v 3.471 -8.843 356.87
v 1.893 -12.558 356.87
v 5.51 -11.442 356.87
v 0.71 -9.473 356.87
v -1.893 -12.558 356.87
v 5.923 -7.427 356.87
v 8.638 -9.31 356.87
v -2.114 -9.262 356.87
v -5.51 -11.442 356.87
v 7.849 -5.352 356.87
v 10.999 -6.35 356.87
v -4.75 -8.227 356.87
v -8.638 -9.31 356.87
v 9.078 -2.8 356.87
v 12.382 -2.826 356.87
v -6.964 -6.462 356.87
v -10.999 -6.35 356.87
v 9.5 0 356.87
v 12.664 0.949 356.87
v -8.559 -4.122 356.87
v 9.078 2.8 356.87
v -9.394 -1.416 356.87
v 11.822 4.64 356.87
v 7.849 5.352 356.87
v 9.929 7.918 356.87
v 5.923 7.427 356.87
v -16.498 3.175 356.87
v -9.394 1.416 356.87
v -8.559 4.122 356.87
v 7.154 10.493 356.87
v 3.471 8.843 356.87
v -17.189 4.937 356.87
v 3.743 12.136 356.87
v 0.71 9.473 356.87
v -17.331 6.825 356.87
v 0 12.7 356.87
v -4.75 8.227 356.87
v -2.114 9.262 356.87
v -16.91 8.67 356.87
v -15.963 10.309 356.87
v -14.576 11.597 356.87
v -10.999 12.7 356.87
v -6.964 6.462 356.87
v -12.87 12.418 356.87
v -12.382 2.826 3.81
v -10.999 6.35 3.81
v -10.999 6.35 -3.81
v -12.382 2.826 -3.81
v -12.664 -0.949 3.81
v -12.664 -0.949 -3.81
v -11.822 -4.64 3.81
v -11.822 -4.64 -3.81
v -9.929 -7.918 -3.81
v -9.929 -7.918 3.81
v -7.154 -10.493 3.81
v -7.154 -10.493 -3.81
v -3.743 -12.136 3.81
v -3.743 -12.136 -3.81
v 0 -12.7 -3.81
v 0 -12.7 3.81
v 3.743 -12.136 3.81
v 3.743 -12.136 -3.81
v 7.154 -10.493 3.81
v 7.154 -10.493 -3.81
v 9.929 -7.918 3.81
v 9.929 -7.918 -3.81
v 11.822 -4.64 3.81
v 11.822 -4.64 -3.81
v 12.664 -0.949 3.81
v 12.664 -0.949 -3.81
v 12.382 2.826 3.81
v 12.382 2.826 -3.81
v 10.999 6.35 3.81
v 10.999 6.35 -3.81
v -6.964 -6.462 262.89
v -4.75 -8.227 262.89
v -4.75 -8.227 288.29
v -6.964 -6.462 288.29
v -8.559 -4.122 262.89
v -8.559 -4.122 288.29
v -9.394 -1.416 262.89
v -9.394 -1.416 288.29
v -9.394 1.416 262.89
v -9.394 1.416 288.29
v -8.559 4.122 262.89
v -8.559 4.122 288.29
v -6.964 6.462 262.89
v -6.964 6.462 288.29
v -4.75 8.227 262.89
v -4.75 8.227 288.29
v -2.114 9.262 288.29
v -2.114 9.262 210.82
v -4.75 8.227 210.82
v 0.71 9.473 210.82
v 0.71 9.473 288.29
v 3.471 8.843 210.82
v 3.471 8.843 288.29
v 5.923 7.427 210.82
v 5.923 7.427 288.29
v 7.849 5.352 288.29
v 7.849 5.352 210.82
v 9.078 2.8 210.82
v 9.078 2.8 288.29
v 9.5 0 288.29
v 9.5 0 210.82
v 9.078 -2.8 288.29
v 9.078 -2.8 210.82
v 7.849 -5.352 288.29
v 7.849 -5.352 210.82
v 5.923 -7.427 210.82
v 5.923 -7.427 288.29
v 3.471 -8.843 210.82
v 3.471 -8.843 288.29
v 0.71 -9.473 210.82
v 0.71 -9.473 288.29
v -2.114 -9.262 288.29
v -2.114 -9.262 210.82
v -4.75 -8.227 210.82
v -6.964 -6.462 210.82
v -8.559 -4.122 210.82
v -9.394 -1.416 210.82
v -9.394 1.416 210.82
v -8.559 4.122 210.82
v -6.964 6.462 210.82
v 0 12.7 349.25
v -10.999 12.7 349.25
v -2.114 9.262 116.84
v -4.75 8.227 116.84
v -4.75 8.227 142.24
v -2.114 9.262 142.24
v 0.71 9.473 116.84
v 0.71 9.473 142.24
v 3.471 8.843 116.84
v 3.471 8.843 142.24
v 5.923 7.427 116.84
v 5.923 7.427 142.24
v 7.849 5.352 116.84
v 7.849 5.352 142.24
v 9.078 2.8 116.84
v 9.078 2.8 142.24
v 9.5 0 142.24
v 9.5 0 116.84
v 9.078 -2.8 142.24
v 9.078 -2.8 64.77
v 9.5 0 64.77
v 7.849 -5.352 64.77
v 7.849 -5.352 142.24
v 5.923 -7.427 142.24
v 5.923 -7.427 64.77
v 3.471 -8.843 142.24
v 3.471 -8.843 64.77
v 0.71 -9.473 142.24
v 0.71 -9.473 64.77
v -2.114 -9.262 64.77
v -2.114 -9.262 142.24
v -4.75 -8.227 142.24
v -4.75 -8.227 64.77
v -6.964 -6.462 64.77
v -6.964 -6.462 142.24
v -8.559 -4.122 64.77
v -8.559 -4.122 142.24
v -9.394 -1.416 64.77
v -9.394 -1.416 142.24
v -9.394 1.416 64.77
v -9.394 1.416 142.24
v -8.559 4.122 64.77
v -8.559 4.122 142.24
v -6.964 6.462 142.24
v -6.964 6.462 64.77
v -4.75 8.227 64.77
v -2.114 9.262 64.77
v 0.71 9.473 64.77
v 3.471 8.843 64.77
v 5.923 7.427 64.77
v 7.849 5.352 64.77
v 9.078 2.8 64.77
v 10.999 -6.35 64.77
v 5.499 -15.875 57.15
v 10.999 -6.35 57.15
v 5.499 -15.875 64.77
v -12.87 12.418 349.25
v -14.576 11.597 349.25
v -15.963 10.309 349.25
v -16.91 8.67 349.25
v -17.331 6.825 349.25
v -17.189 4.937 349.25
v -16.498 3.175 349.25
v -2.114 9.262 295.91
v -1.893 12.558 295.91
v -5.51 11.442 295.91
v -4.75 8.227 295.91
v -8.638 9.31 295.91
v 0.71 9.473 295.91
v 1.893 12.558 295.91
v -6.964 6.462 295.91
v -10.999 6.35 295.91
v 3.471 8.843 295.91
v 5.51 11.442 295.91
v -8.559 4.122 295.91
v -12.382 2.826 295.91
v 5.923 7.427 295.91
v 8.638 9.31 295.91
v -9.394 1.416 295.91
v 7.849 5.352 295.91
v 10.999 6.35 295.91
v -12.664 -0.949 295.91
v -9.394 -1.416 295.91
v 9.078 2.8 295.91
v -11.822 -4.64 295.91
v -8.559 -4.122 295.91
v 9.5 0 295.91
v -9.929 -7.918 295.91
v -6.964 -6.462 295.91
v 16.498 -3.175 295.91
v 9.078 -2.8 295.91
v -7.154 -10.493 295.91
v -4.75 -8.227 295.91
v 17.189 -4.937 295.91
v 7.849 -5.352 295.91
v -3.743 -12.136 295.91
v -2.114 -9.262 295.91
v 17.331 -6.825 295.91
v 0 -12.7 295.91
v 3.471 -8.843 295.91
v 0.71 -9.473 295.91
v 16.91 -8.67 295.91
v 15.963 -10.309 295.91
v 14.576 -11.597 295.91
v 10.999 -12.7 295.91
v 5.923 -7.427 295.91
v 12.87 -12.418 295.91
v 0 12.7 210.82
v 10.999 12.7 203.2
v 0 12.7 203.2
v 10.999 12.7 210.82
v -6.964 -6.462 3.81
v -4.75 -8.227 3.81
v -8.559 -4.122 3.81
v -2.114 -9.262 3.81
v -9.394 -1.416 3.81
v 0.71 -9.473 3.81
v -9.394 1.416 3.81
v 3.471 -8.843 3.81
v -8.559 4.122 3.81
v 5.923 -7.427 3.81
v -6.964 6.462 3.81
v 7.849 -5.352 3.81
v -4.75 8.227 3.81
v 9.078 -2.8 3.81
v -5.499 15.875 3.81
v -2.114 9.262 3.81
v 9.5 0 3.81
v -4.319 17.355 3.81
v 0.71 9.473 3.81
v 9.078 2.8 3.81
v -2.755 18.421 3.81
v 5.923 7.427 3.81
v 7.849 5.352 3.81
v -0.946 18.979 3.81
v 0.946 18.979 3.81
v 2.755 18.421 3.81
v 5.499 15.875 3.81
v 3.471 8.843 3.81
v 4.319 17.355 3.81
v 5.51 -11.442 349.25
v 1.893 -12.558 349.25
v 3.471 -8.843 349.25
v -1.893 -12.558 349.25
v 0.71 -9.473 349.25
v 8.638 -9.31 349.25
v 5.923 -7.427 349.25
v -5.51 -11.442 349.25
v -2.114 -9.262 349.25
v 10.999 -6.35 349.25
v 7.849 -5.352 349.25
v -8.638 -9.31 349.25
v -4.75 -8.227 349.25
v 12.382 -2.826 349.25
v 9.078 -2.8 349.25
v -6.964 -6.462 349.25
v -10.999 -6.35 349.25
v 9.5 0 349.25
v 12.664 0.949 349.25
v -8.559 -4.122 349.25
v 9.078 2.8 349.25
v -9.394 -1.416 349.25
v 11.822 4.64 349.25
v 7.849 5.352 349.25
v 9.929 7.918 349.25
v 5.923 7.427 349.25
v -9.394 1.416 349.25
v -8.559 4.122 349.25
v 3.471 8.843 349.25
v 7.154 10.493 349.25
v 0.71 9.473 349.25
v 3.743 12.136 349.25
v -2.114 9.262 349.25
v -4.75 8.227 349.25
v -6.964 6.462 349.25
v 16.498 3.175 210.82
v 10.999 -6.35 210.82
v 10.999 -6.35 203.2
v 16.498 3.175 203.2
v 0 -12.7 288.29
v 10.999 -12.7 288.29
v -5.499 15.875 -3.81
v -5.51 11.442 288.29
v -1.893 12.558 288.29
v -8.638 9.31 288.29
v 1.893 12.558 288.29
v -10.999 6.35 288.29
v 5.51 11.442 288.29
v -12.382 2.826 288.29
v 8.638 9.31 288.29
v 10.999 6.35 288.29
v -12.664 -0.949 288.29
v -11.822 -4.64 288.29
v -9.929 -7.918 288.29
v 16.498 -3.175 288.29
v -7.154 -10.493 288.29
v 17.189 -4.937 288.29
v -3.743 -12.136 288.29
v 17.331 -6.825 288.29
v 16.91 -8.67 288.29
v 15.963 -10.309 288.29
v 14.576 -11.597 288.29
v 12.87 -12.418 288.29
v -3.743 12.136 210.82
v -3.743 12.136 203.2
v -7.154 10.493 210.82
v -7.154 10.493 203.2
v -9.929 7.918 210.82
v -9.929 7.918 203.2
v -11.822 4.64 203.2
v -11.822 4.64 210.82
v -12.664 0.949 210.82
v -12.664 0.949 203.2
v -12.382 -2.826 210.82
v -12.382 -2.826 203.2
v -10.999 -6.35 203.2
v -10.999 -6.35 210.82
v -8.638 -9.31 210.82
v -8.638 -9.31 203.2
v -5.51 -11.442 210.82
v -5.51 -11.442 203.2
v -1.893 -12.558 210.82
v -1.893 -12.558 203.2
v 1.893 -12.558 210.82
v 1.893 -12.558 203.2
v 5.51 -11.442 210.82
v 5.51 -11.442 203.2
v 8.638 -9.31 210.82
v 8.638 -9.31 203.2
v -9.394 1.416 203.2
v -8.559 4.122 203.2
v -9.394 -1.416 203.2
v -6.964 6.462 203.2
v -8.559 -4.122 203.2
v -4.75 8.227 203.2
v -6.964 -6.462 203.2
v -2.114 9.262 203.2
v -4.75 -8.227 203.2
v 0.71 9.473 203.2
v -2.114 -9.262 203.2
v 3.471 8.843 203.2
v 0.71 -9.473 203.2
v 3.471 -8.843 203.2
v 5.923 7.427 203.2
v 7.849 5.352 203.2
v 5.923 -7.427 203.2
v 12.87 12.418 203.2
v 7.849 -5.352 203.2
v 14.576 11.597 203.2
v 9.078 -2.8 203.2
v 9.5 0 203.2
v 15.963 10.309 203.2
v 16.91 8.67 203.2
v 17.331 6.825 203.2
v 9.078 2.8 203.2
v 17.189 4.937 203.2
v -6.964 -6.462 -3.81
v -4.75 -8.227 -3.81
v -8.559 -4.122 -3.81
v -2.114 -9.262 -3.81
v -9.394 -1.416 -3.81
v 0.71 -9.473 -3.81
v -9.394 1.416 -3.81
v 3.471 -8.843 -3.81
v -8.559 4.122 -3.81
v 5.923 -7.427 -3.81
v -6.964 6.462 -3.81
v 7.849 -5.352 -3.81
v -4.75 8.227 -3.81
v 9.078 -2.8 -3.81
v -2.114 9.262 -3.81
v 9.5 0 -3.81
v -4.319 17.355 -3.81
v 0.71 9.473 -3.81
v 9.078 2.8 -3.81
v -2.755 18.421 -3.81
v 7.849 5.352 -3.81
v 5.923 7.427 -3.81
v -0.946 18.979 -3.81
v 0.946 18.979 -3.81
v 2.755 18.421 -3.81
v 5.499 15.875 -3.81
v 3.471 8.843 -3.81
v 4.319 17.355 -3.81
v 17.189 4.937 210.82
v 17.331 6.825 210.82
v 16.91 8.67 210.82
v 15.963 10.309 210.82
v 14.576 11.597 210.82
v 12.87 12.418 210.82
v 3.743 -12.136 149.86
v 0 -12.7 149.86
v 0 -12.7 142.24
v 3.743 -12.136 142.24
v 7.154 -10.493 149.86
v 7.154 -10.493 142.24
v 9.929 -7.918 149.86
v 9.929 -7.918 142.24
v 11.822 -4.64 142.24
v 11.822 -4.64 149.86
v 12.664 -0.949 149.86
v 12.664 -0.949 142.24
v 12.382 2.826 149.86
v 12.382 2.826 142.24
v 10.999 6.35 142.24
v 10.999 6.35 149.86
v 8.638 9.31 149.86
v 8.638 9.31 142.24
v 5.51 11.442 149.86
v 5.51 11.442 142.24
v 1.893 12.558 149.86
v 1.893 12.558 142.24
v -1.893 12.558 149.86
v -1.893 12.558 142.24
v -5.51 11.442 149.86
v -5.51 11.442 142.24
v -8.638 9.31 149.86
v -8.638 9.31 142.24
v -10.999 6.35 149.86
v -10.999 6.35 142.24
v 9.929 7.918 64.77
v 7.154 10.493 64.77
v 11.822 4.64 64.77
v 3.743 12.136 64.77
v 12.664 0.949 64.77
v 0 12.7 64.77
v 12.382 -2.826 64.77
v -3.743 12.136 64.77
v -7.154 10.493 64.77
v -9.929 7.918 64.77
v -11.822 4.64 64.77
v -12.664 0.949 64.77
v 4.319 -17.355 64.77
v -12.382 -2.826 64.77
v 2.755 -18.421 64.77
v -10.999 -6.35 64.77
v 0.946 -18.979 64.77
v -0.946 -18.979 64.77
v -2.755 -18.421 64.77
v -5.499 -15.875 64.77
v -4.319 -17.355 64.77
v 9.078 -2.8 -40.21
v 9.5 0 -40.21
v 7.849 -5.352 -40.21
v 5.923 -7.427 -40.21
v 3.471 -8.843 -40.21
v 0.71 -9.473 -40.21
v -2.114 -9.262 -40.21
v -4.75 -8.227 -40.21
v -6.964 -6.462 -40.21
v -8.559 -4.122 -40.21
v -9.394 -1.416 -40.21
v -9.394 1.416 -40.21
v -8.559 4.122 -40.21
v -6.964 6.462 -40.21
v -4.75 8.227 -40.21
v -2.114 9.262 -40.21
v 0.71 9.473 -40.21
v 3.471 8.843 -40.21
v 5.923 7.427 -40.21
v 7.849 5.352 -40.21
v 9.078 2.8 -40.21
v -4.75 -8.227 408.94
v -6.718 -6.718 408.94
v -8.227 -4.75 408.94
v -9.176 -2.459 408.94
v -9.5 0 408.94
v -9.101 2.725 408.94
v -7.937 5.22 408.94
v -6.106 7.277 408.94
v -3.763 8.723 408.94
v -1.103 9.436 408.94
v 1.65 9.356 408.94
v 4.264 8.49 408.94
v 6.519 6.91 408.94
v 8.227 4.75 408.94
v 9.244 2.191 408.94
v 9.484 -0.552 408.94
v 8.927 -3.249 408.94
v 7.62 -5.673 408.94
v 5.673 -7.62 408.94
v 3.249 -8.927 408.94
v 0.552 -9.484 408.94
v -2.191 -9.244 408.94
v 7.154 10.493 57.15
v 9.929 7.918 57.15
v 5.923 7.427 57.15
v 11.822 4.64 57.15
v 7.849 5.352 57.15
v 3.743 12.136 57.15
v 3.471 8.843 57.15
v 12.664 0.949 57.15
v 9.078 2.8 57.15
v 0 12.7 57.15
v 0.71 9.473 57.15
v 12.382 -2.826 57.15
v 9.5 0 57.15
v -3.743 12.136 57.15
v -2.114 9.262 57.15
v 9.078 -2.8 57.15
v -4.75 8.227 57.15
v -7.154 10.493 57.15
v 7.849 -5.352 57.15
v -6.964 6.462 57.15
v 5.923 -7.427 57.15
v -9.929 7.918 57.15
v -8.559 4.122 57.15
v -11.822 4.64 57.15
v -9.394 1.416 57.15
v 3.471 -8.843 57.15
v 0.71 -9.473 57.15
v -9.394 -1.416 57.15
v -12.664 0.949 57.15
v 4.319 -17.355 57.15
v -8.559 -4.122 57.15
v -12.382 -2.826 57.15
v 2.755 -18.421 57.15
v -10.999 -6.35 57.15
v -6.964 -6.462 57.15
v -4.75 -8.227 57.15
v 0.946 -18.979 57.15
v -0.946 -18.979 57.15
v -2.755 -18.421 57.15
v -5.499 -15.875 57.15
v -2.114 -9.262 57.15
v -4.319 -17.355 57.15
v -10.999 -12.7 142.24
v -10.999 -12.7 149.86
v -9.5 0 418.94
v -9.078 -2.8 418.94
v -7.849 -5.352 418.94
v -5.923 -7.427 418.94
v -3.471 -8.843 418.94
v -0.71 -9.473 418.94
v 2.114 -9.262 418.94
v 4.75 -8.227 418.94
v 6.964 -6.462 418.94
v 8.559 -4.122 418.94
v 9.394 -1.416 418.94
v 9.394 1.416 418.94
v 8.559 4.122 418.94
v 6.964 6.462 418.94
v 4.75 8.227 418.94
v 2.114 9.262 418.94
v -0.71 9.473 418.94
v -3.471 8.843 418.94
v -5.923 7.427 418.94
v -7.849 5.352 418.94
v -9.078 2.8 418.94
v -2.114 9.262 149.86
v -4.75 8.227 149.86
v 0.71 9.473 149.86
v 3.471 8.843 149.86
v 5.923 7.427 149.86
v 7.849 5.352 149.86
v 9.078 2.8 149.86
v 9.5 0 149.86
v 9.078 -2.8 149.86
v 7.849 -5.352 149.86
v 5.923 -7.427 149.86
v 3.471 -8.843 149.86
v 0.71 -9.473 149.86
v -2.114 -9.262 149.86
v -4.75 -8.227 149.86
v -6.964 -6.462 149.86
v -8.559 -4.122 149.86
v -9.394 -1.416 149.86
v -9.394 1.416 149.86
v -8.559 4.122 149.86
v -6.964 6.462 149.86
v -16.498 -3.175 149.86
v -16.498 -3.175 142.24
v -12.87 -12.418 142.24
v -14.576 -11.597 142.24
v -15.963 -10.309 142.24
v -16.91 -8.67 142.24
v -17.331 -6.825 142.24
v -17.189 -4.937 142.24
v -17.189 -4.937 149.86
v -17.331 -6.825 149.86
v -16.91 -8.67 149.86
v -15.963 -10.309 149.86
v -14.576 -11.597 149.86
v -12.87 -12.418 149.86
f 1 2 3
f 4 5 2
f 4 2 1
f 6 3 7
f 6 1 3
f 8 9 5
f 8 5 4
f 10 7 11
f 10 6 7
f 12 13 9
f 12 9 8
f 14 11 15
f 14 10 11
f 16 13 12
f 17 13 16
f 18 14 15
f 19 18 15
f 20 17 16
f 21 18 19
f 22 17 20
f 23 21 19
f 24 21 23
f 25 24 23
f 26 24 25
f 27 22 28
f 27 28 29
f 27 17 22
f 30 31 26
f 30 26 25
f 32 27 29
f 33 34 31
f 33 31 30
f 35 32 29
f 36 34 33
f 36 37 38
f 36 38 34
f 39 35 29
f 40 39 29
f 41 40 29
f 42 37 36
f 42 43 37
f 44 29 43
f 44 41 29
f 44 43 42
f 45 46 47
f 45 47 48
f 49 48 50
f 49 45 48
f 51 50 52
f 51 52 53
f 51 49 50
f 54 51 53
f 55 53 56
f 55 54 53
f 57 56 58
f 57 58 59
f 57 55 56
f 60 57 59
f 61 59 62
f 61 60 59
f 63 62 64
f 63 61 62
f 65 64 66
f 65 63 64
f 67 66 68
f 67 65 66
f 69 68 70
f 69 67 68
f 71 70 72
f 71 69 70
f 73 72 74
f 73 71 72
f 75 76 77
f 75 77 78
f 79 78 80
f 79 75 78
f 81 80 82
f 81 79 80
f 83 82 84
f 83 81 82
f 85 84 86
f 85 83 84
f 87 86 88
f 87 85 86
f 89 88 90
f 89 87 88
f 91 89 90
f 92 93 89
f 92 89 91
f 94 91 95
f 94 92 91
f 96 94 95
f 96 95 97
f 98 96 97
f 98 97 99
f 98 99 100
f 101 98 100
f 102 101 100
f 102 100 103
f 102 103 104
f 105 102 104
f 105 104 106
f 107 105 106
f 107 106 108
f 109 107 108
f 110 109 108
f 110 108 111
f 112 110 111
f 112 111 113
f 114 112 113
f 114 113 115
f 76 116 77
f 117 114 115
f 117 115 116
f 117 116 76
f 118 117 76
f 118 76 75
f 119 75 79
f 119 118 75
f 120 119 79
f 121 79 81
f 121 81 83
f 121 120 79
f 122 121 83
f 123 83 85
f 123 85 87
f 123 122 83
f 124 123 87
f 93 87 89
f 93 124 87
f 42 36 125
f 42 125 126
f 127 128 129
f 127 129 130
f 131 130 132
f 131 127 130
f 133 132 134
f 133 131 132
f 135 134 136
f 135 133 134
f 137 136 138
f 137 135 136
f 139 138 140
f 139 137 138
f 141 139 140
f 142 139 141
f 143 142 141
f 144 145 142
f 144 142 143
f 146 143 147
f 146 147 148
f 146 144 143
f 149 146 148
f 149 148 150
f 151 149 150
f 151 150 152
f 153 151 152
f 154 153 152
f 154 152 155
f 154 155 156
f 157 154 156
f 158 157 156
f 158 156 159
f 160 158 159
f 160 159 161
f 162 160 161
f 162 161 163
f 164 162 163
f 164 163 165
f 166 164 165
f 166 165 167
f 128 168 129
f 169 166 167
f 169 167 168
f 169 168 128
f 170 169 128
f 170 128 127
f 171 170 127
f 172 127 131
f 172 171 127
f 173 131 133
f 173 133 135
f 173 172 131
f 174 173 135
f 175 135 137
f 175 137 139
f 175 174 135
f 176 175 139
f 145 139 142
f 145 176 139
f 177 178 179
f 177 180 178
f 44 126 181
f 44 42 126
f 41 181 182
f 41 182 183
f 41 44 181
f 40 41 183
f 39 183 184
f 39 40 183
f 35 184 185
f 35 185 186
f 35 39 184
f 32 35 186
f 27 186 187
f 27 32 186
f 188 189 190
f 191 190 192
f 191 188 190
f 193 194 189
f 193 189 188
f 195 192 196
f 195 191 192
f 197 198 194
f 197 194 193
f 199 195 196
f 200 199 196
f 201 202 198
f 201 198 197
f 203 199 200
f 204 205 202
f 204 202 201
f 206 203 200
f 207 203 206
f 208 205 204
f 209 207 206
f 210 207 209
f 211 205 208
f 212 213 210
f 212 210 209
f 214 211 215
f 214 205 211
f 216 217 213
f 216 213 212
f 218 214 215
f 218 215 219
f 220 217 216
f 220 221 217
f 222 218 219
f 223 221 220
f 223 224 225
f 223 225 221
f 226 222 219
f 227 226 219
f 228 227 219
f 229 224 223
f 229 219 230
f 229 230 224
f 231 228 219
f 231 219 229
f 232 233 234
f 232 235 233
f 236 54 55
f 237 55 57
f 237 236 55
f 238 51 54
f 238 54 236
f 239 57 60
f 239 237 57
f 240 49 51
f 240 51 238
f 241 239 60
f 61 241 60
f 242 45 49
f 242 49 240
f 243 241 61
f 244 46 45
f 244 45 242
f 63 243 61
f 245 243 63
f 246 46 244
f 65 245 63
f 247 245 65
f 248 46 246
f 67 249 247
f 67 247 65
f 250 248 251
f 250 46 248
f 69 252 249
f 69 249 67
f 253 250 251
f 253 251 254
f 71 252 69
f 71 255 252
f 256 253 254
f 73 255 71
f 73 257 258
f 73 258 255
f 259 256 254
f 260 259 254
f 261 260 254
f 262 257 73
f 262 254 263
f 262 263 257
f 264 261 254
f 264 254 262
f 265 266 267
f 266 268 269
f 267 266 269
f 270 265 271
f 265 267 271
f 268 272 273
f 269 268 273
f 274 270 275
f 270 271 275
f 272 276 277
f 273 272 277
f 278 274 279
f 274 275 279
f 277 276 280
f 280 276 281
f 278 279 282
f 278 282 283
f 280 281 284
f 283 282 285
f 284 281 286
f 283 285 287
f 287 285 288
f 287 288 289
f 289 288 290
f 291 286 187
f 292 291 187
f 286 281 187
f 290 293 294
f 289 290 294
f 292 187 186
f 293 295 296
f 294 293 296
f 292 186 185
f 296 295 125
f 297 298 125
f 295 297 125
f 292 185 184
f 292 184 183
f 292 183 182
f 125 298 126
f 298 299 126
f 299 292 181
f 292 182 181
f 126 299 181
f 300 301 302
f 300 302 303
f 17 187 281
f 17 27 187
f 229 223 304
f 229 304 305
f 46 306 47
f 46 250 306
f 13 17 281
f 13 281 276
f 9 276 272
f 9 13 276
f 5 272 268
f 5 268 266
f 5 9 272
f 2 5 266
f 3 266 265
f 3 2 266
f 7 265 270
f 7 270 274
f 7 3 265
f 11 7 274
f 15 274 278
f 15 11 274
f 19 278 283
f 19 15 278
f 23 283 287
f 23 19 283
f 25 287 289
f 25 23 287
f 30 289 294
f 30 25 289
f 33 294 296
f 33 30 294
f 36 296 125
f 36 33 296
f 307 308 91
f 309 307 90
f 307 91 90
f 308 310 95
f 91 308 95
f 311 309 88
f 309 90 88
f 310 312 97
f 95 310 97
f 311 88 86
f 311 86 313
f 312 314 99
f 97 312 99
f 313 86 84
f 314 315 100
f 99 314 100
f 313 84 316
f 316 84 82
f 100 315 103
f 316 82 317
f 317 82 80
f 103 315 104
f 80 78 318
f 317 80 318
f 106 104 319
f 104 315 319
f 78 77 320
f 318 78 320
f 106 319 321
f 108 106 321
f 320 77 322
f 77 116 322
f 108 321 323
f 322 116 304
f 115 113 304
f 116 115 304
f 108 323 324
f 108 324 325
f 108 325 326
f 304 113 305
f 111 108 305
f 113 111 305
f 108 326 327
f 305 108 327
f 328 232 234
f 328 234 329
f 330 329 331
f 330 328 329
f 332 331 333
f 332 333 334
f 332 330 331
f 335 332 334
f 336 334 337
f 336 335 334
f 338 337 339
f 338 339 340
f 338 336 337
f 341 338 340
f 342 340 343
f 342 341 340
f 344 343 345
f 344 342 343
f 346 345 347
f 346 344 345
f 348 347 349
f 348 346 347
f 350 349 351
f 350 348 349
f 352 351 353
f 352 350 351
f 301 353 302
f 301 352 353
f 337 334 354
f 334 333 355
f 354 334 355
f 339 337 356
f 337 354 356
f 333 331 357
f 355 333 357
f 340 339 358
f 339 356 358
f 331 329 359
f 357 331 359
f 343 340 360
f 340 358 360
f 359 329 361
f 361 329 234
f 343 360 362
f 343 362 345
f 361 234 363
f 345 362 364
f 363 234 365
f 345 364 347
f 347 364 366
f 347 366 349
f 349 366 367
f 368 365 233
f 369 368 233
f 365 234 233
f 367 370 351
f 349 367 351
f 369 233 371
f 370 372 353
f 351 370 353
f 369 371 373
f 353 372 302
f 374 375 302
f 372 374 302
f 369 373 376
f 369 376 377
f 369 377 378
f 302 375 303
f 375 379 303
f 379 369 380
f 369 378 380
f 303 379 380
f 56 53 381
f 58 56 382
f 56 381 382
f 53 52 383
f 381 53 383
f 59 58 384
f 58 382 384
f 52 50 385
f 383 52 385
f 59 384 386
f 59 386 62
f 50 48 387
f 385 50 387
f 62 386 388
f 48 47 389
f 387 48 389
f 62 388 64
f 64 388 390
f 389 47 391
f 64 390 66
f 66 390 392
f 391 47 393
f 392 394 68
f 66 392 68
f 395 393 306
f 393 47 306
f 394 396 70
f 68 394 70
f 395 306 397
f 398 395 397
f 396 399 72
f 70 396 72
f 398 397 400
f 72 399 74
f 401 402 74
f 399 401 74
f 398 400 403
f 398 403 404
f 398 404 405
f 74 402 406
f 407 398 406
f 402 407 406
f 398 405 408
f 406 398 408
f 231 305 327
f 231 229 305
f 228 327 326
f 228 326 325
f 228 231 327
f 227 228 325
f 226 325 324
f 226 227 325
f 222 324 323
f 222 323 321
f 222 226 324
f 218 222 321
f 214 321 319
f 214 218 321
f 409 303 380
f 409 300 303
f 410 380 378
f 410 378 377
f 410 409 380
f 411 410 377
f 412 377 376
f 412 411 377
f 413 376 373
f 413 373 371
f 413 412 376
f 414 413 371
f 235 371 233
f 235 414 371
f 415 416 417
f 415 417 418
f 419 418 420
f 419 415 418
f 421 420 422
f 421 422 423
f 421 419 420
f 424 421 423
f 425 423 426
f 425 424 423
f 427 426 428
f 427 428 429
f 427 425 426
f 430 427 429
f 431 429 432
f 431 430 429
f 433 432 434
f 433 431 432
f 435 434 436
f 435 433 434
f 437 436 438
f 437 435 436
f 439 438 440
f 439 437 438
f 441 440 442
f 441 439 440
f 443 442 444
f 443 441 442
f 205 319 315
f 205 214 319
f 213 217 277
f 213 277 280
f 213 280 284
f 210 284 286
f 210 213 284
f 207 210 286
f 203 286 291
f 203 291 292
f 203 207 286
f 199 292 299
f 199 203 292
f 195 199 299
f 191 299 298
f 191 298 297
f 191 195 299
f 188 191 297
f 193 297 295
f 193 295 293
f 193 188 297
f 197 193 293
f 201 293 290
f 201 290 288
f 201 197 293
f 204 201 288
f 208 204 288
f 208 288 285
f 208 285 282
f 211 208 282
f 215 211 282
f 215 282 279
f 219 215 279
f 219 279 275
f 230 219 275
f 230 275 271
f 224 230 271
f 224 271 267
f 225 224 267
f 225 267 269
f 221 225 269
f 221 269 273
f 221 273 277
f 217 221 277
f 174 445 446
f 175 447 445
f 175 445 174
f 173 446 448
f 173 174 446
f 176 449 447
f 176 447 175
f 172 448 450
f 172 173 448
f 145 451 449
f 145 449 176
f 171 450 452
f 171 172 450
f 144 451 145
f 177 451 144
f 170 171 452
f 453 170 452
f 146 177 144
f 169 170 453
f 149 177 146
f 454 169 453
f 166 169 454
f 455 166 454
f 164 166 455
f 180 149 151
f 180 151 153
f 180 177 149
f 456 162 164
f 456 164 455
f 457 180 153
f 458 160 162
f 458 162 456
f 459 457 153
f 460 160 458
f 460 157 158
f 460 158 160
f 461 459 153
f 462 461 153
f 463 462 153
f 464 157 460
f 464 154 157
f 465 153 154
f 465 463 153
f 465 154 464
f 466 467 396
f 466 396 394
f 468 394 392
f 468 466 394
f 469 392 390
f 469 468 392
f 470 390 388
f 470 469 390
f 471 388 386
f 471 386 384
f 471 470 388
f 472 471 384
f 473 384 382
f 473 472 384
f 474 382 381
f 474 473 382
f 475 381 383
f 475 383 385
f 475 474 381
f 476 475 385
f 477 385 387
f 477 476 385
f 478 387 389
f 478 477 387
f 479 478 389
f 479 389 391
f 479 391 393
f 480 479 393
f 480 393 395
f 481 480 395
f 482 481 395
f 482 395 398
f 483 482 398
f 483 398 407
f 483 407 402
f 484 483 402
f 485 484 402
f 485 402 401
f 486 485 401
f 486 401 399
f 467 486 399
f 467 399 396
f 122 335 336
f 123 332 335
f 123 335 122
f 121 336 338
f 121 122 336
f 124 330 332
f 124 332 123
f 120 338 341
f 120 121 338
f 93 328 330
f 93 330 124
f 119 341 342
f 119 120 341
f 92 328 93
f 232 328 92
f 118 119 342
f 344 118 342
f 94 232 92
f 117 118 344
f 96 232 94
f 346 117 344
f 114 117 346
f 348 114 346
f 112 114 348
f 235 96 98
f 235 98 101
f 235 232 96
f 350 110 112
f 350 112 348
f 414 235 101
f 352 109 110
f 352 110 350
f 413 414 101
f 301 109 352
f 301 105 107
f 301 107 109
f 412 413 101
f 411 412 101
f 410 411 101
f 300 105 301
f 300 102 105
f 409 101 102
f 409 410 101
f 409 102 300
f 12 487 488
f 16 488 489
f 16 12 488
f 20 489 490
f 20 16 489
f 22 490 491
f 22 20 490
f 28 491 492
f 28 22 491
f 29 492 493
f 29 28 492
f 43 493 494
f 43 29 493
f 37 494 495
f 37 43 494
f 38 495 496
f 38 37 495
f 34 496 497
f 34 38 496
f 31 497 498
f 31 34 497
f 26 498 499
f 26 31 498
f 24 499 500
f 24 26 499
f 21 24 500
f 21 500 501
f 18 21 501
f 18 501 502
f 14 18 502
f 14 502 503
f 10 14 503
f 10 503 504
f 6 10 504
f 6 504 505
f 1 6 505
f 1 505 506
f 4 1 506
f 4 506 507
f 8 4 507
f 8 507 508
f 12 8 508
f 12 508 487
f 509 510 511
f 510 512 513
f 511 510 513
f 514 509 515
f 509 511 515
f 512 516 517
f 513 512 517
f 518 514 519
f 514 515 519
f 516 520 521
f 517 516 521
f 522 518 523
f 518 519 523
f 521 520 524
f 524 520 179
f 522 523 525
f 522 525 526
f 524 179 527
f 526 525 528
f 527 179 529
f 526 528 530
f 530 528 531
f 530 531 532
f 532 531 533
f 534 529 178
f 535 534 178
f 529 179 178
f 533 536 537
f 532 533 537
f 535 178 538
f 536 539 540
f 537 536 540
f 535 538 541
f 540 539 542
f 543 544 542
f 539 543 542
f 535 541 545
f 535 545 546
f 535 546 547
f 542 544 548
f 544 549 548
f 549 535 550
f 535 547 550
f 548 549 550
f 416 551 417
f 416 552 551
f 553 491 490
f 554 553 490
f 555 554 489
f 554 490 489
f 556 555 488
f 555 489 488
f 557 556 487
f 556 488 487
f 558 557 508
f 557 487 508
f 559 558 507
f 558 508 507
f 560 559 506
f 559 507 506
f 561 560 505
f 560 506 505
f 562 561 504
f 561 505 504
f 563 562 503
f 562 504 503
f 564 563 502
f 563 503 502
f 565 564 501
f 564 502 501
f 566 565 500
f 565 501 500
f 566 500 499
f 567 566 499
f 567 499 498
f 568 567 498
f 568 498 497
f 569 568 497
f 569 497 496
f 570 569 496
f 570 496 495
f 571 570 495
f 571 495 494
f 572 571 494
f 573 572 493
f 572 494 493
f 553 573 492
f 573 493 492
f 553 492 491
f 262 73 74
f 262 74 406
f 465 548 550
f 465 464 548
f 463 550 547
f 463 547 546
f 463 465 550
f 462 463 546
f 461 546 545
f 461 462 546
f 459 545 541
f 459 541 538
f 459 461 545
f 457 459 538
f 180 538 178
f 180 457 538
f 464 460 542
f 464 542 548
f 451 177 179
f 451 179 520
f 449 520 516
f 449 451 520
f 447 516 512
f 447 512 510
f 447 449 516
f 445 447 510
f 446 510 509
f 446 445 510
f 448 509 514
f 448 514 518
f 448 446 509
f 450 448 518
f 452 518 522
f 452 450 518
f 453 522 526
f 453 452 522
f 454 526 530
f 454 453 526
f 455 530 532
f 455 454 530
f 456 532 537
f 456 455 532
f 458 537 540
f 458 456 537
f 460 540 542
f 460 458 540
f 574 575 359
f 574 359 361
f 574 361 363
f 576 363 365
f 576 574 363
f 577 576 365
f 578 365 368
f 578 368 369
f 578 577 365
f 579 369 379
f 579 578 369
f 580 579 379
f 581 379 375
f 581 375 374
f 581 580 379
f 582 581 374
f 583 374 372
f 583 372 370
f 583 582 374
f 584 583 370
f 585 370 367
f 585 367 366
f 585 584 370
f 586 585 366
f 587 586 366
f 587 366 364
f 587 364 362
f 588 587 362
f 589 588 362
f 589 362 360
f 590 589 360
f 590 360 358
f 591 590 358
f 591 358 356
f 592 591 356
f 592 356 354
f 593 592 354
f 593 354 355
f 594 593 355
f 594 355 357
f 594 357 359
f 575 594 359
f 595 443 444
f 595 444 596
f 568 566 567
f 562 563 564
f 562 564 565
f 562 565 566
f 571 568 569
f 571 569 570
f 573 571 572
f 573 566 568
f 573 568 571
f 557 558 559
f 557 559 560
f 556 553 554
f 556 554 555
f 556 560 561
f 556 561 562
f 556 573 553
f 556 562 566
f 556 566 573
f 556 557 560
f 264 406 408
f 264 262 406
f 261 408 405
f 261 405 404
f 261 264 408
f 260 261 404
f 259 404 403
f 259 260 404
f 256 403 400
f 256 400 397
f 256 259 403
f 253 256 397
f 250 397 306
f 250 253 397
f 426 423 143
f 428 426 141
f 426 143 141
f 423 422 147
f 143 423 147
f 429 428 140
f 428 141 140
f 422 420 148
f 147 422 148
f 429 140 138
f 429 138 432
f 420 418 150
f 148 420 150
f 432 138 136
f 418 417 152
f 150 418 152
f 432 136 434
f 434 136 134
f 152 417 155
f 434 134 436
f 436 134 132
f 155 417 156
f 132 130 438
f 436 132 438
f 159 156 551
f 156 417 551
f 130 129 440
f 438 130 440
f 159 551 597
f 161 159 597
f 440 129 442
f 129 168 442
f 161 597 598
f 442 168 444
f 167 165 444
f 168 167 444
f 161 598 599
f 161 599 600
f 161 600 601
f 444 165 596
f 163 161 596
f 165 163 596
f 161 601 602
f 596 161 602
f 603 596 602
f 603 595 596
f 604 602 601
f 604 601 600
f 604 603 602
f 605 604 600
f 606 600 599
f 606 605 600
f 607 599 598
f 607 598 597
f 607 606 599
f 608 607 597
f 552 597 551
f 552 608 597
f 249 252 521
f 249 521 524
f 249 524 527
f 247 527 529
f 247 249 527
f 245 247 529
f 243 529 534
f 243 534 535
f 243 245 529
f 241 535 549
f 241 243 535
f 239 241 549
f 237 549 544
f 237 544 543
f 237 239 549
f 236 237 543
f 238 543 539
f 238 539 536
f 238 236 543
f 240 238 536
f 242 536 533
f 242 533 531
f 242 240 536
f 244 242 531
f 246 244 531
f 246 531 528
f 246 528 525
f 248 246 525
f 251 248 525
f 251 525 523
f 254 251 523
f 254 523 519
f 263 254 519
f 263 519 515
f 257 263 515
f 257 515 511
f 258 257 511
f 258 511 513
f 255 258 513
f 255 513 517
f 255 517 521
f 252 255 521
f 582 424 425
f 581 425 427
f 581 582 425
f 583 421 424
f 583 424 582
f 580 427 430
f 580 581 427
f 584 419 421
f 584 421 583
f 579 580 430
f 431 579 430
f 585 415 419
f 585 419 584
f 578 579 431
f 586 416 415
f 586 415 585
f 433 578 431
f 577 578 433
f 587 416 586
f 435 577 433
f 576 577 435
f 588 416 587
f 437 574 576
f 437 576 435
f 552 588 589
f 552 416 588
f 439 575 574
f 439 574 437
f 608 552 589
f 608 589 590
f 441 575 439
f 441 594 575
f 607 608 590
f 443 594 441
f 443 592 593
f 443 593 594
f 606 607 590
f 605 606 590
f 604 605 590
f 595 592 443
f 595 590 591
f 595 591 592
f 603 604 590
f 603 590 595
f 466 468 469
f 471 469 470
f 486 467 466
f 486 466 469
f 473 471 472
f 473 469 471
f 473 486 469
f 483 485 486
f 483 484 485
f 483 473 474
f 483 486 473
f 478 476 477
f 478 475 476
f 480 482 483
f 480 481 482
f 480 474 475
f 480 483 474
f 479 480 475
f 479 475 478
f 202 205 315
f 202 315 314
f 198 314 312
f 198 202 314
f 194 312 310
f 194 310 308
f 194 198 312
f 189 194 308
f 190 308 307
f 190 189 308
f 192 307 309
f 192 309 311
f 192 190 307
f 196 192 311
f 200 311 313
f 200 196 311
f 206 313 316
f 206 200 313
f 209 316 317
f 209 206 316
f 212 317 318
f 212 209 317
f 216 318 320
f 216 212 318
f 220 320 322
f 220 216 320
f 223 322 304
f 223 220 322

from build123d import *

# Parameters (mm, degrees)
BOSS_EXTRUDE1_DEPTH   = 3.81
BODY_MOVE_COPY2_ANGLE = 180
SKETCH2_R             = 9.5
BOSS_EXTRUDE2_DEPTH   = 146.05
LPATTERN1_COUNT       = 3
LPATTERN1_PITCH       = 146.05
BODY_MOVE_COPY3_ANGLE = 120
BODY_MOVE_COPY4_ANGLE = 120
BOSS_EXTRUDE3_START   = 27.94
SKETCH3_R             = 9.5
BOSS_EXTRUDE3_DEPTH   = 27.94
SKETCH4_R             = 9.5
CUT_EXTRUDE1_DEPTH    = 16.94
SKETCH5_R             = 9.5
BOSS_EXTRUDE4_DEPTH   = 10


with BuildPart() as part:
    # Sketch1 → Boss-Extrude1 (new, symmetric)
    with BuildSketch(Plane.XY):
        with BuildLine():
            Line((-5.499261314, 15.875), (-10.998522628, 6.35))
            ThreePointArc((-10.998522628, 6.35), (0, -12.7), (10.998522628, 6.35))
            Line((10.998522628, 6.35), (5.499261314, 15.875))
            ThreePointArc((5.499261314, 15.875), (0, 19.05), (-5.499261314, 15.875))
        make_face()
    extrude(amount=BOSS_EXTRUDE1_DEPTH, both=True)


with BuildPart() as body_2:
    # Body-Move/Copy1: copy of part
    add(part.part.moved(Location((0, 0, 60.96))))


with BuildPart() as body_2_1:
    # Body-Move/Copy2: moved
    add(body_2.part.rotate(Axis((0, 0, 0), (0, 0, 1)), BODY_MOVE_COPY2_ANGLE))


with BuildPart() as part_1:
    add(part.part)

    add(body_2_1.part)  # Boss-Extrude2 merges body 2
    # Sketch2 → Boss-Extrude2 (add)
    with BuildSketch(Plane(origin=(0, 0, -29.21), x_dir=(-1, 0, 0), z_dir=(0, 0, -1))):
        Circle(SKETCH2_R)
    extrude(amount=-BOSS_EXTRUDE2_DEPTH)


with BuildPart() as lpattern1_1:
    # LPattern1: pattern copy
    add(part_1.part.moved(Location(Vector(0, 0, 1) * (1 * LPATTERN1_PITCH))))


with BuildPart() as lpattern1_2:
    # LPattern1: pattern copy
    add(part_1.part.moved(Location(Vector(0, 0, 1) * (2 * LPATTERN1_PITCH))))


with BuildPart() as lpattern1_1_1:
    # Body-Move/Copy3: moved
    add(lpattern1_1.part.rotate(Axis((0, 0, 0), (0, 0, 1)), BODY_MOVE_COPY3_ANGLE))


with BuildPart() as lpattern1_2_1:
    # Body-Move/Copy4: moved
    add(lpattern1_2.part.rotate(Axis((0, 0, 0), (0, 0, -1)), BODY_MOVE_COPY4_ANGLE))


with BuildPart() as part_2:
    add(part_1.part)

    # Sketch3 → Boss-Extrude3 (add)
    with BuildSketch(Plane(origin=(0, 0, -29.21), x_dir=(-1, 0, 0), z_dir=(0, 0, -1)).offset(BOSS_EXTRUDE3_START)):
        Circle(SKETCH3_R)
    extrude(amount=-BOSS_EXTRUDE3_DEPTH)


with BuildPart() as lpattern1_2_2:
    add(lpattern1_2_1.part)

    # Combine1: union LPattern1_1, part
    add(lpattern1_1_1.part)
    add(part_2.part)

    # Sketch4 → Cut-Extrude1 (cut)
    with BuildSketch(Plane(origin=(0, 0, -57.15), x_dir=(-1, 0, 0), z_dir=(0, 0, -1))):
        Circle(SKETCH4_R)
    extrude(amount=-CUT_EXTRUDE1_DEPTH, mode=Mode.SUBTRACT)

    # Sketch5 → Boss-Extrude4 (add)
    with BuildSketch(Plane.XY.offset(408.94)):
        Circle(SKETCH5_R)
    extrude(amount=BOSS_EXTRUDE4_DEPTH)


solid = lpattern1_2_2.part
